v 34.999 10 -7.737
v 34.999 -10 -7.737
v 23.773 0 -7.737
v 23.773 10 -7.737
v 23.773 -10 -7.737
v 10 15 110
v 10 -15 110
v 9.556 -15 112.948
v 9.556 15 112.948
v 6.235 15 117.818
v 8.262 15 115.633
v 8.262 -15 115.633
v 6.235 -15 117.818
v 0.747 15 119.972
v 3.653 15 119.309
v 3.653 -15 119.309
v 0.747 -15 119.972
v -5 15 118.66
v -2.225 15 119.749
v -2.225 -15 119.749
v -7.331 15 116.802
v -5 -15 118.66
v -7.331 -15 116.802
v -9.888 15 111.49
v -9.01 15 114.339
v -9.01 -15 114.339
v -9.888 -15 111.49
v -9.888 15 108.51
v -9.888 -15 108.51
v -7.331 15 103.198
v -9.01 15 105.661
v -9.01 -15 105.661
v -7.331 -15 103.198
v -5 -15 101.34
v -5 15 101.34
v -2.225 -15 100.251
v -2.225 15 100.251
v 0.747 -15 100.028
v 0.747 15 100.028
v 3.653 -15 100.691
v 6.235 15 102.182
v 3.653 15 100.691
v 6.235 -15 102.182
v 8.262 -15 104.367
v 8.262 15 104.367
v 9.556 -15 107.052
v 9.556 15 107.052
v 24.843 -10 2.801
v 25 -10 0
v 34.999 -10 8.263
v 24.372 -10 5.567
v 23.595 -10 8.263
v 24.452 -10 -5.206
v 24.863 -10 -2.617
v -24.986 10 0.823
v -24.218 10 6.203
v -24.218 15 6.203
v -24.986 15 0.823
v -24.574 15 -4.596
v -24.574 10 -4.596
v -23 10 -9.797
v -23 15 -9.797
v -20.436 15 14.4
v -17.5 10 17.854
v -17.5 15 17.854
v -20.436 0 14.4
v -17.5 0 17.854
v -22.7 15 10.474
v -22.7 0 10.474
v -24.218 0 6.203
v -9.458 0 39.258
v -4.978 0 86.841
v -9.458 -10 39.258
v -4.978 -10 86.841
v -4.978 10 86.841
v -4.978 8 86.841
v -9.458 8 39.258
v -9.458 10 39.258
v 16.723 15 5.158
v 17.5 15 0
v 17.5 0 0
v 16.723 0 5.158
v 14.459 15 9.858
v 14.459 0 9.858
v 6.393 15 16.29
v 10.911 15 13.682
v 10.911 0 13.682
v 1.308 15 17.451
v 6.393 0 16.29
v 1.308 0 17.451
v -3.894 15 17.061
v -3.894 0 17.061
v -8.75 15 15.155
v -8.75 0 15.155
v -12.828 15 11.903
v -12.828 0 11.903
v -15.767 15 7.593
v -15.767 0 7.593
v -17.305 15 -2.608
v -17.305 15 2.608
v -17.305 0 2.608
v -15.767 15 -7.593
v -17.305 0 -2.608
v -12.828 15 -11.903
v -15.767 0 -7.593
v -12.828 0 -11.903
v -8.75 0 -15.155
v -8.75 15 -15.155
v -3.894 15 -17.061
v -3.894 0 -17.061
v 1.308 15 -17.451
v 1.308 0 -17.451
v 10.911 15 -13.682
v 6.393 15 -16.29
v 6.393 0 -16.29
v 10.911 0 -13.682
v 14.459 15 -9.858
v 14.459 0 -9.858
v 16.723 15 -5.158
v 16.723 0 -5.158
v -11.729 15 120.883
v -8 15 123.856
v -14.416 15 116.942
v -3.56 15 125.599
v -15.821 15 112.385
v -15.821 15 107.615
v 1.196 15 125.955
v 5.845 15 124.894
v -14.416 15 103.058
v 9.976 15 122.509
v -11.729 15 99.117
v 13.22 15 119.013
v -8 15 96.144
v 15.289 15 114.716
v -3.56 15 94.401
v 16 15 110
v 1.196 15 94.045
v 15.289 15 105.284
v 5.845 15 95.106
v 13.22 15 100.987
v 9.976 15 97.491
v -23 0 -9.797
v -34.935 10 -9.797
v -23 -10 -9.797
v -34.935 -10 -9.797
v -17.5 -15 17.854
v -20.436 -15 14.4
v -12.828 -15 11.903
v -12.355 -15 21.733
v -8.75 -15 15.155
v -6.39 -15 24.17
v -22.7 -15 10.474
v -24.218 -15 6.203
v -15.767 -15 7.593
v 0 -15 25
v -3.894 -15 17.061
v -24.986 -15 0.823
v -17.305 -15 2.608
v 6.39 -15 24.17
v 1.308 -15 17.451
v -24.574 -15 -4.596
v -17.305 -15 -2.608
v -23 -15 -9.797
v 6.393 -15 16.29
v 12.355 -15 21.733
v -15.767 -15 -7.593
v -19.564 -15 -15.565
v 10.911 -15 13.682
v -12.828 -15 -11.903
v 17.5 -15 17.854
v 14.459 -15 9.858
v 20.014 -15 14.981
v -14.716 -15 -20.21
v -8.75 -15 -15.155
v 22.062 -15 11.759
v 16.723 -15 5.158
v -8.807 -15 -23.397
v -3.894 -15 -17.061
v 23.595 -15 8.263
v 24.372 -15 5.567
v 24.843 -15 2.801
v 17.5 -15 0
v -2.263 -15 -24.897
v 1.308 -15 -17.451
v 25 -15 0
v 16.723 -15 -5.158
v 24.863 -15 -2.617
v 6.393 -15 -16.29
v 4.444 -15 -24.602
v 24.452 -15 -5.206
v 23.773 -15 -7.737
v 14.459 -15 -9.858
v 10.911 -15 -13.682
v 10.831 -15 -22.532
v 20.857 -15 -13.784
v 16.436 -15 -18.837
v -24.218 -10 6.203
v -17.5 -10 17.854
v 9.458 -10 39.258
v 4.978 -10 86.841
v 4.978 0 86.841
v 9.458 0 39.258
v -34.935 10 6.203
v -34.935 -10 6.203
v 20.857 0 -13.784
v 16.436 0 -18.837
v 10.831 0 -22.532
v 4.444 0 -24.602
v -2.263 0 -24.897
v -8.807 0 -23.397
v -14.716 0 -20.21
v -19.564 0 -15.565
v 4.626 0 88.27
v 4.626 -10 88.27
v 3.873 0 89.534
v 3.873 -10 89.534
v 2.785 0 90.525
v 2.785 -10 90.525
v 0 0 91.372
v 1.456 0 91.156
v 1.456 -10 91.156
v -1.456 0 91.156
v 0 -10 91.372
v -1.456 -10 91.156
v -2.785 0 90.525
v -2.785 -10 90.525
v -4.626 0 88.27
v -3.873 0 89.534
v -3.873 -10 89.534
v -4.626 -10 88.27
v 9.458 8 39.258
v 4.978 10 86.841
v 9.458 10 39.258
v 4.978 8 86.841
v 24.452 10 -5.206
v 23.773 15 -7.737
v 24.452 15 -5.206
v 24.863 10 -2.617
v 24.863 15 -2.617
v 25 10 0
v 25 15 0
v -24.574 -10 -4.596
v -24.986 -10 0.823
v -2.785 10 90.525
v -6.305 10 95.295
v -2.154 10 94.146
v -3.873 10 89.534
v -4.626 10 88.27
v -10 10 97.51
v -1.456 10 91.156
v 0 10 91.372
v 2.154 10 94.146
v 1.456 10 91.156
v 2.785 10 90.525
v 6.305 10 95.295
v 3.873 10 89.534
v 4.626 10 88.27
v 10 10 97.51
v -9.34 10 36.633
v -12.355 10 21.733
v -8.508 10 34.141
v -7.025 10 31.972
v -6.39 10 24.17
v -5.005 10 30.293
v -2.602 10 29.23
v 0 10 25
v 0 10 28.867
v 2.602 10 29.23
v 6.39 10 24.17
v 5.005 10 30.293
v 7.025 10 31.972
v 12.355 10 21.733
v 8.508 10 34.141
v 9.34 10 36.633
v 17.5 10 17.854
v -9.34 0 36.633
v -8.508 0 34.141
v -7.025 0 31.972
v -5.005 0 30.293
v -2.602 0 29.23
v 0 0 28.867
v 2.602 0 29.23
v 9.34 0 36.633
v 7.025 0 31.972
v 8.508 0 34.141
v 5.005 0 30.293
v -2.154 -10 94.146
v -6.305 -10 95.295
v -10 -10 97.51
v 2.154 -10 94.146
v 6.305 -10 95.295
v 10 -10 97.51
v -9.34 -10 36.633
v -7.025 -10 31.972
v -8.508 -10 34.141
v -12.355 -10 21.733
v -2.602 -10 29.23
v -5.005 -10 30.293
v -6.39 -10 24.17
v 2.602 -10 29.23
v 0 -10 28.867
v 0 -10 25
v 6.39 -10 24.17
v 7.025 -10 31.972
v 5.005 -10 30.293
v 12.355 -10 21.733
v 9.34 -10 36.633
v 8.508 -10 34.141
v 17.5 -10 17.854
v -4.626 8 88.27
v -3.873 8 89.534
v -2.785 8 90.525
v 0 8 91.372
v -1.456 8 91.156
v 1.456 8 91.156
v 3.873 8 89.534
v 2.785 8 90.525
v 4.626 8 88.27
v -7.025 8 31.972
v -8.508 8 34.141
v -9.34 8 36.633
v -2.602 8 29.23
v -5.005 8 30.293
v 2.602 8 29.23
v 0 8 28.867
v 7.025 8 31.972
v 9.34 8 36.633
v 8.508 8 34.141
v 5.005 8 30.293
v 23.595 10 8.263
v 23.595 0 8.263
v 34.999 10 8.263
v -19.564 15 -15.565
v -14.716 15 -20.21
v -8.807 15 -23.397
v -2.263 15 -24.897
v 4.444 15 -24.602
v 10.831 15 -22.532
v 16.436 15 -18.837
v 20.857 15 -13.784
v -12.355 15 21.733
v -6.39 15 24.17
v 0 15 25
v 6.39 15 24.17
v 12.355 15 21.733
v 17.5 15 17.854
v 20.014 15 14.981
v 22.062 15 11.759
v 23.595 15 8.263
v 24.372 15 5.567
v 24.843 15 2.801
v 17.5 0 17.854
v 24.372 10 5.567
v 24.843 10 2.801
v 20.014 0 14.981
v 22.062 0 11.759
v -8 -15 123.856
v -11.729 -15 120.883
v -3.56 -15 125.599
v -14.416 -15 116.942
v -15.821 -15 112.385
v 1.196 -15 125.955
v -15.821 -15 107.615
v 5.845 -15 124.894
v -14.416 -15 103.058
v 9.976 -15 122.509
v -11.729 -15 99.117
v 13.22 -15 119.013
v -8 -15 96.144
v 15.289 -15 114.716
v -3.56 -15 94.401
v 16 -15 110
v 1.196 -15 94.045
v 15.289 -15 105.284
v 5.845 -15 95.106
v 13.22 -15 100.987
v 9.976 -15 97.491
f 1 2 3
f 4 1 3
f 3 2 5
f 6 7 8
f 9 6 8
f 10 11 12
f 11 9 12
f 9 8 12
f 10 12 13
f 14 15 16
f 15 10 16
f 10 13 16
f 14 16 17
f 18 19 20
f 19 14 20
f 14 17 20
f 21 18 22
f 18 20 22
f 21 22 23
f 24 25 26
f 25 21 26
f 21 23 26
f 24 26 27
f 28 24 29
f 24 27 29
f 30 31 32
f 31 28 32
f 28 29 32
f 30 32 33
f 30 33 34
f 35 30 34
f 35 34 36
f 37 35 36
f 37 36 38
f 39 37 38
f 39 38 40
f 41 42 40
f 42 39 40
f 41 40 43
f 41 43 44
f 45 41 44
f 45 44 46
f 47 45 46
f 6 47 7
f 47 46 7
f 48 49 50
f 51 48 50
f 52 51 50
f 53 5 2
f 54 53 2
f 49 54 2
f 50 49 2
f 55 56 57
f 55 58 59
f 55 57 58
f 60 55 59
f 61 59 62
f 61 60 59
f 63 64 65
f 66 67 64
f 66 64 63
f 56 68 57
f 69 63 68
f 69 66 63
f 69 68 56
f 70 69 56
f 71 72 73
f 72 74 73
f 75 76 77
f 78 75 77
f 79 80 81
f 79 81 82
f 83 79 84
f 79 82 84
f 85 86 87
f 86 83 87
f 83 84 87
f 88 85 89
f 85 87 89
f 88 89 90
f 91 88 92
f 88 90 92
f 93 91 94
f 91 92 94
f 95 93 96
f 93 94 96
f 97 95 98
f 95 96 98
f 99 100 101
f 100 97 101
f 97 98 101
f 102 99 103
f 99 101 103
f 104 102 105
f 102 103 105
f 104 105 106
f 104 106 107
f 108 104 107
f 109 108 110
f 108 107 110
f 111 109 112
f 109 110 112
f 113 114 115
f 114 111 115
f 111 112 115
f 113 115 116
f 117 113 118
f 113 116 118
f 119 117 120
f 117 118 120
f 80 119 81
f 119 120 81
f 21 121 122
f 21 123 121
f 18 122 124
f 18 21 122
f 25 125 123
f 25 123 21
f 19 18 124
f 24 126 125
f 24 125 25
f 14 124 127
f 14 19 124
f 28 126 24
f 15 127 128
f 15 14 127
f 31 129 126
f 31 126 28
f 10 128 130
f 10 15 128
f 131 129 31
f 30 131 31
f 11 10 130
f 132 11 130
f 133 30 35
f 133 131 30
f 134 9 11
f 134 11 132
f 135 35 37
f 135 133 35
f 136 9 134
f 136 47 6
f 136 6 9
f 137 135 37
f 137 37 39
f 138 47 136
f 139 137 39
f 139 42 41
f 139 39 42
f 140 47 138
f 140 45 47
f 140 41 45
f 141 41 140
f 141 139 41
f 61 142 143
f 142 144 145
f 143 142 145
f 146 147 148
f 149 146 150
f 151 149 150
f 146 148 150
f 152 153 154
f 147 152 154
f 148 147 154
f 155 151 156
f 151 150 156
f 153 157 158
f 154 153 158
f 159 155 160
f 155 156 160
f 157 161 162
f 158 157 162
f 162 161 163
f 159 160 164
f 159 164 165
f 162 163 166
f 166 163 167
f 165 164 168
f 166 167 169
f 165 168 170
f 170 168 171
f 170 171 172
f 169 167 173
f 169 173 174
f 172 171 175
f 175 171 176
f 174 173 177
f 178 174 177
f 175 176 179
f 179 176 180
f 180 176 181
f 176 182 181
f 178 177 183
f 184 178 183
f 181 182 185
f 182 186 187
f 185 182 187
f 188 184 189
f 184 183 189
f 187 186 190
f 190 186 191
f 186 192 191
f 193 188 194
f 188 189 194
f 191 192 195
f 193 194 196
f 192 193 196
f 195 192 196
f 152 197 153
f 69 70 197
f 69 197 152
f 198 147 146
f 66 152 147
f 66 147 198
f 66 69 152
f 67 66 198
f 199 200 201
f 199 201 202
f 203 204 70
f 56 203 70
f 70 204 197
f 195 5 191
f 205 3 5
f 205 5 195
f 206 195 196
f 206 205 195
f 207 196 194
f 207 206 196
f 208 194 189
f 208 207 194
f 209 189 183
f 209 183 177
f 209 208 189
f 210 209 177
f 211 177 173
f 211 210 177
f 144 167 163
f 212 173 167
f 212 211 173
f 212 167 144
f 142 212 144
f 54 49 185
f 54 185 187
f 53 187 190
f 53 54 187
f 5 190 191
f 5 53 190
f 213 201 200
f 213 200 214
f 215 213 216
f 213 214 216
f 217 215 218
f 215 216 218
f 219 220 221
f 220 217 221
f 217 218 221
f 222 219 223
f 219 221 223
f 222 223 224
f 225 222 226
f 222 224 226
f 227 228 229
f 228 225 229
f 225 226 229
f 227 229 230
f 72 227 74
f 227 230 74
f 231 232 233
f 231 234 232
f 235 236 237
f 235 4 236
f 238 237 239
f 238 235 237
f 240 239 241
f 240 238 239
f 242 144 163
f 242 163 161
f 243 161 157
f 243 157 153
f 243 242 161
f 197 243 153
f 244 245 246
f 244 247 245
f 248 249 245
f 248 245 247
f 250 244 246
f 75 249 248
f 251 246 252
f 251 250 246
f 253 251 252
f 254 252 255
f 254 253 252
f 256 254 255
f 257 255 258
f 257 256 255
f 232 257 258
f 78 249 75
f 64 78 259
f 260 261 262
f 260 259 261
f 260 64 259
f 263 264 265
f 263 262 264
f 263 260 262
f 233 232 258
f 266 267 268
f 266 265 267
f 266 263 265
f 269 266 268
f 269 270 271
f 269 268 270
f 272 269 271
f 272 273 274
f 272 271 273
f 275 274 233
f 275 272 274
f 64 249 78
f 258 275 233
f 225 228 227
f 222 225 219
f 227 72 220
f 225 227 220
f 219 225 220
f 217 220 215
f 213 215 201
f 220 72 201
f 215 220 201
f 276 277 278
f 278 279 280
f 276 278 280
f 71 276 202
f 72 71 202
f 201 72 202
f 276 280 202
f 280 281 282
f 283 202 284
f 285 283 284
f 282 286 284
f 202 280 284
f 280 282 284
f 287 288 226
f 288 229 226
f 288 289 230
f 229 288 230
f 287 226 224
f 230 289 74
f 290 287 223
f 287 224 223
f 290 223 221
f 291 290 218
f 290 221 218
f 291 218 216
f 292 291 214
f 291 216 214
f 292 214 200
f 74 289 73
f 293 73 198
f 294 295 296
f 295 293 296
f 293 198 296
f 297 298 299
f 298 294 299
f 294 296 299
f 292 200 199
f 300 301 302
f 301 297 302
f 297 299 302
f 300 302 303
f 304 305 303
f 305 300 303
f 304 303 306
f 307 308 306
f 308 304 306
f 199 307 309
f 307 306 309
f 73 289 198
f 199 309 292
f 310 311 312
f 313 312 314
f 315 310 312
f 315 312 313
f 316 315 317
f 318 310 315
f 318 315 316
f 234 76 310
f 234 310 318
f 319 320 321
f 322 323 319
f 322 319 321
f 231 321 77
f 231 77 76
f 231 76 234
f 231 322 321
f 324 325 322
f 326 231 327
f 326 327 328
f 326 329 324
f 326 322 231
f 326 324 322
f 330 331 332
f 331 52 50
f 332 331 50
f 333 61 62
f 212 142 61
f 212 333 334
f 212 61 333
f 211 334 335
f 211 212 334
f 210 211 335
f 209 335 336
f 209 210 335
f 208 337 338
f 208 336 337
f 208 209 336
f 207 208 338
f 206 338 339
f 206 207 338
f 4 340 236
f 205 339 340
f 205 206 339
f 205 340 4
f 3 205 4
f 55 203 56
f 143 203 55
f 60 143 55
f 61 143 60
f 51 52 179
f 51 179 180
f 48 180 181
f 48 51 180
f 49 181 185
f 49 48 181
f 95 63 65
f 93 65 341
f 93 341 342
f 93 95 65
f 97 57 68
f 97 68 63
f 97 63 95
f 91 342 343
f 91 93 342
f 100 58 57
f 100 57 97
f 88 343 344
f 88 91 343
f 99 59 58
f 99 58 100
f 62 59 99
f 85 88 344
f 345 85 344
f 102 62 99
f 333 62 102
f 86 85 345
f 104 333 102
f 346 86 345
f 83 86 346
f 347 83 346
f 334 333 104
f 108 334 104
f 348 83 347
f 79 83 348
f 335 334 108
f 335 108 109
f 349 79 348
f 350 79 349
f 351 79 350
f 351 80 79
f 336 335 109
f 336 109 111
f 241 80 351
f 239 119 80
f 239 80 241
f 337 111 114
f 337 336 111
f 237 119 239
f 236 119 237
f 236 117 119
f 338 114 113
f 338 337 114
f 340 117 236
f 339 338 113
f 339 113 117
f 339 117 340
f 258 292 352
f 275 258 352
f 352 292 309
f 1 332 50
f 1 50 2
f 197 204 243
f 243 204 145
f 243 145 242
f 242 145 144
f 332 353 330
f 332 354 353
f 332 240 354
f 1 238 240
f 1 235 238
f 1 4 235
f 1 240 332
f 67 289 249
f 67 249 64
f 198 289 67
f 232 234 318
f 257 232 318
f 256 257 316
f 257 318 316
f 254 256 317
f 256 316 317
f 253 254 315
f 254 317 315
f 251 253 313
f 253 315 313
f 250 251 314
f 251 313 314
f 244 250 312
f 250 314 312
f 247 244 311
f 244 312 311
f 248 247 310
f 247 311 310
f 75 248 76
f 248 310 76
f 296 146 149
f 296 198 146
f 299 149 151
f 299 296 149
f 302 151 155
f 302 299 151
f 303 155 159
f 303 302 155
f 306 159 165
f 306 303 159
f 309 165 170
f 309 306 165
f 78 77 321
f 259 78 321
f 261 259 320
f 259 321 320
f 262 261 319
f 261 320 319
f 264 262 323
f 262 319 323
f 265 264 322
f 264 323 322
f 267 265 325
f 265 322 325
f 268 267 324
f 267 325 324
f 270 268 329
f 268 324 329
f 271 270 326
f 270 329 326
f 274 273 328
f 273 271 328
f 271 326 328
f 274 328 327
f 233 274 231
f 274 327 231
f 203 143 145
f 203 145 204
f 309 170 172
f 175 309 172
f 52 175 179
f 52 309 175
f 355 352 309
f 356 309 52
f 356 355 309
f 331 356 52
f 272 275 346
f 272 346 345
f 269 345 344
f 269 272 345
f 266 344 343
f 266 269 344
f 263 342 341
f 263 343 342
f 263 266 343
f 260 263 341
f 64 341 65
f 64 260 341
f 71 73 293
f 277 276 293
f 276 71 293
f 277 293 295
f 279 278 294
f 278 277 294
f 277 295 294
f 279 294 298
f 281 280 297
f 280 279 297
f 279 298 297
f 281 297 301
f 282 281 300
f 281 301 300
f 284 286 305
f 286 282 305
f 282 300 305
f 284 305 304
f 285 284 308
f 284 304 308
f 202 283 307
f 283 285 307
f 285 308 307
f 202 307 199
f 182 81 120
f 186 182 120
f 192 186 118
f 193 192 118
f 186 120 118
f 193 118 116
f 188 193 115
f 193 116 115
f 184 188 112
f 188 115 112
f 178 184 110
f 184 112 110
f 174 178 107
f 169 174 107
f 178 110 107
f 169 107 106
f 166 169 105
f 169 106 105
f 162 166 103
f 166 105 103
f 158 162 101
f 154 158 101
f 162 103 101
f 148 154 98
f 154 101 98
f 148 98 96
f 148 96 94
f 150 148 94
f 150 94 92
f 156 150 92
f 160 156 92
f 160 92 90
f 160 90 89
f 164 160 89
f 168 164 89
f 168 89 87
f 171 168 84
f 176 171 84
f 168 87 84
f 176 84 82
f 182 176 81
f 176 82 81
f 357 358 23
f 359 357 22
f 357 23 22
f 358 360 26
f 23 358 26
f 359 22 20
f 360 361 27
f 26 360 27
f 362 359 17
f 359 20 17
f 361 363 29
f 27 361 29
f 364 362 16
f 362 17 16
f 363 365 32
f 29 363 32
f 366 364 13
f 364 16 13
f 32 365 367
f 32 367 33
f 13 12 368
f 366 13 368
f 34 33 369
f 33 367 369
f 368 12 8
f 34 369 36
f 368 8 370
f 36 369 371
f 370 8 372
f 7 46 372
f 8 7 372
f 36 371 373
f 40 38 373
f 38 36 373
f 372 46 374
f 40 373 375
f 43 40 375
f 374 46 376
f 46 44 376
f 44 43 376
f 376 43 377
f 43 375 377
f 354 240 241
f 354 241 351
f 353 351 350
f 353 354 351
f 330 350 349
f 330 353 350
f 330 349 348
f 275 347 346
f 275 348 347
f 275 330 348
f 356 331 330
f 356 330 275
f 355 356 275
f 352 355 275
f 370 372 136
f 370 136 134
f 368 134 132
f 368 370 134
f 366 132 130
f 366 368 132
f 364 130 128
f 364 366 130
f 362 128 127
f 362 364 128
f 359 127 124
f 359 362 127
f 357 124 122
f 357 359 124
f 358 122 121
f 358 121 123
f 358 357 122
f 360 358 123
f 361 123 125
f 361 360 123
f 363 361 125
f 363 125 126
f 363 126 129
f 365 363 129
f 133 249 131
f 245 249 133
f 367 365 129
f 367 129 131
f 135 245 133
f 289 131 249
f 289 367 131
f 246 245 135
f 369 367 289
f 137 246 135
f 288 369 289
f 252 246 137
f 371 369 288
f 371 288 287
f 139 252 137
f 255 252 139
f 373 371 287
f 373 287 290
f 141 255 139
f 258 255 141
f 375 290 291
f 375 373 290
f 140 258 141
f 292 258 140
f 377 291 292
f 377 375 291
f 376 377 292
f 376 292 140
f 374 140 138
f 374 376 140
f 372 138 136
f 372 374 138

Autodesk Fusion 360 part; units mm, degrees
sketch "Sketch1" plane through (0, 0, 0) normal (0, 1, 0) x (1, 0, 0)
  circle A0 centre (0, 0) radius 17.5
  circle A1 centre (0, 0) radius 25
  circle A2 centre (0, -110) radius 10
  circle A3 centre (0, -110) radius 16
  line L0 (-10, -97.51) -> (-17.5, -17.8536)
  line L1 (10, -97.51) -> (17.5, -17.8536)
  line L2 (-23.0003, 9.7972) -> (-34.9353, 9.7972)
  line L3 (-34.9353, 9.7972) -> (-34.9353, -6.2028)
  line L4 (-14.9353, 9.7972) -> (-34.9353, -6.2028) construction
  line L5 (-34.9353, 9.7972) -> (-14.9353, -6.2028) construction
  line L6 (34.9986, -8.2633) -> (34.9986, 7.7367)
  line L7 (34.9986, 7.7367) -> (14.9986, -8.2633) construction
  line L8 (14.9986, 7.7367) -> (34.9986, -8.2633) construction
  line L9 (-34.9353, -6.2028) -> (-24.2183, -6.2028)
  line L10 (23.5949, -8.2633) -> (34.9986, -8.2633)
  line L11 (34.9986, 7.7367) -> (23.7727, 7.7367)
  arc A4 (9.4582, -39.2577) -> (-9.4582, -39.2577) centre (0, -38.3672) ccw
  arc A5 (-4.978, -86.8411) -> (4.978, -86.8411) centre (0, -86.3724) ccw
  line L12 (-4.978, -86.8411) -> (-9.4582, -39.2577)
  line L13 (4.978, -86.8411) -> (9.4582, -39.2577)
  point P0 (-24.9353, 1.7972)
  point P1 (24.9986, -0.2633)
  dimension "d1" = 35
  dimension "d2" = 50
  dimension "d3" = 20
  dimension "d4" = 32
  dimension "d5" = 110
  dimension "d6" = 20
  dimension "d7" = 35
  dimension "d10" = 5
  dimension "d11" = 9.5
  dimension "d12" = 16
  dimension "d13" = 20
  dimension "d14" = 16
  dimension "d15" = 20
extrude "Extrude1" add sketch "Sketch1" along normal mid plane 30 contours A1 | A3 makes body 1 at (17.413, 10, 1.7424) makes body 2 at (15.9205, 5, 108.4069)
extrude "Extrude2" add sketch "Sketch1" along normal mid plane 20 contours A1 L6 L10 L11 | A1 L2 L3 L9 | A1 A3 L0 L1 bodies 1 2
extrude "Extrude3" add sketch "Sketch1" along normal blind 8 contours A4 A5 L12 L13 bodies 1
